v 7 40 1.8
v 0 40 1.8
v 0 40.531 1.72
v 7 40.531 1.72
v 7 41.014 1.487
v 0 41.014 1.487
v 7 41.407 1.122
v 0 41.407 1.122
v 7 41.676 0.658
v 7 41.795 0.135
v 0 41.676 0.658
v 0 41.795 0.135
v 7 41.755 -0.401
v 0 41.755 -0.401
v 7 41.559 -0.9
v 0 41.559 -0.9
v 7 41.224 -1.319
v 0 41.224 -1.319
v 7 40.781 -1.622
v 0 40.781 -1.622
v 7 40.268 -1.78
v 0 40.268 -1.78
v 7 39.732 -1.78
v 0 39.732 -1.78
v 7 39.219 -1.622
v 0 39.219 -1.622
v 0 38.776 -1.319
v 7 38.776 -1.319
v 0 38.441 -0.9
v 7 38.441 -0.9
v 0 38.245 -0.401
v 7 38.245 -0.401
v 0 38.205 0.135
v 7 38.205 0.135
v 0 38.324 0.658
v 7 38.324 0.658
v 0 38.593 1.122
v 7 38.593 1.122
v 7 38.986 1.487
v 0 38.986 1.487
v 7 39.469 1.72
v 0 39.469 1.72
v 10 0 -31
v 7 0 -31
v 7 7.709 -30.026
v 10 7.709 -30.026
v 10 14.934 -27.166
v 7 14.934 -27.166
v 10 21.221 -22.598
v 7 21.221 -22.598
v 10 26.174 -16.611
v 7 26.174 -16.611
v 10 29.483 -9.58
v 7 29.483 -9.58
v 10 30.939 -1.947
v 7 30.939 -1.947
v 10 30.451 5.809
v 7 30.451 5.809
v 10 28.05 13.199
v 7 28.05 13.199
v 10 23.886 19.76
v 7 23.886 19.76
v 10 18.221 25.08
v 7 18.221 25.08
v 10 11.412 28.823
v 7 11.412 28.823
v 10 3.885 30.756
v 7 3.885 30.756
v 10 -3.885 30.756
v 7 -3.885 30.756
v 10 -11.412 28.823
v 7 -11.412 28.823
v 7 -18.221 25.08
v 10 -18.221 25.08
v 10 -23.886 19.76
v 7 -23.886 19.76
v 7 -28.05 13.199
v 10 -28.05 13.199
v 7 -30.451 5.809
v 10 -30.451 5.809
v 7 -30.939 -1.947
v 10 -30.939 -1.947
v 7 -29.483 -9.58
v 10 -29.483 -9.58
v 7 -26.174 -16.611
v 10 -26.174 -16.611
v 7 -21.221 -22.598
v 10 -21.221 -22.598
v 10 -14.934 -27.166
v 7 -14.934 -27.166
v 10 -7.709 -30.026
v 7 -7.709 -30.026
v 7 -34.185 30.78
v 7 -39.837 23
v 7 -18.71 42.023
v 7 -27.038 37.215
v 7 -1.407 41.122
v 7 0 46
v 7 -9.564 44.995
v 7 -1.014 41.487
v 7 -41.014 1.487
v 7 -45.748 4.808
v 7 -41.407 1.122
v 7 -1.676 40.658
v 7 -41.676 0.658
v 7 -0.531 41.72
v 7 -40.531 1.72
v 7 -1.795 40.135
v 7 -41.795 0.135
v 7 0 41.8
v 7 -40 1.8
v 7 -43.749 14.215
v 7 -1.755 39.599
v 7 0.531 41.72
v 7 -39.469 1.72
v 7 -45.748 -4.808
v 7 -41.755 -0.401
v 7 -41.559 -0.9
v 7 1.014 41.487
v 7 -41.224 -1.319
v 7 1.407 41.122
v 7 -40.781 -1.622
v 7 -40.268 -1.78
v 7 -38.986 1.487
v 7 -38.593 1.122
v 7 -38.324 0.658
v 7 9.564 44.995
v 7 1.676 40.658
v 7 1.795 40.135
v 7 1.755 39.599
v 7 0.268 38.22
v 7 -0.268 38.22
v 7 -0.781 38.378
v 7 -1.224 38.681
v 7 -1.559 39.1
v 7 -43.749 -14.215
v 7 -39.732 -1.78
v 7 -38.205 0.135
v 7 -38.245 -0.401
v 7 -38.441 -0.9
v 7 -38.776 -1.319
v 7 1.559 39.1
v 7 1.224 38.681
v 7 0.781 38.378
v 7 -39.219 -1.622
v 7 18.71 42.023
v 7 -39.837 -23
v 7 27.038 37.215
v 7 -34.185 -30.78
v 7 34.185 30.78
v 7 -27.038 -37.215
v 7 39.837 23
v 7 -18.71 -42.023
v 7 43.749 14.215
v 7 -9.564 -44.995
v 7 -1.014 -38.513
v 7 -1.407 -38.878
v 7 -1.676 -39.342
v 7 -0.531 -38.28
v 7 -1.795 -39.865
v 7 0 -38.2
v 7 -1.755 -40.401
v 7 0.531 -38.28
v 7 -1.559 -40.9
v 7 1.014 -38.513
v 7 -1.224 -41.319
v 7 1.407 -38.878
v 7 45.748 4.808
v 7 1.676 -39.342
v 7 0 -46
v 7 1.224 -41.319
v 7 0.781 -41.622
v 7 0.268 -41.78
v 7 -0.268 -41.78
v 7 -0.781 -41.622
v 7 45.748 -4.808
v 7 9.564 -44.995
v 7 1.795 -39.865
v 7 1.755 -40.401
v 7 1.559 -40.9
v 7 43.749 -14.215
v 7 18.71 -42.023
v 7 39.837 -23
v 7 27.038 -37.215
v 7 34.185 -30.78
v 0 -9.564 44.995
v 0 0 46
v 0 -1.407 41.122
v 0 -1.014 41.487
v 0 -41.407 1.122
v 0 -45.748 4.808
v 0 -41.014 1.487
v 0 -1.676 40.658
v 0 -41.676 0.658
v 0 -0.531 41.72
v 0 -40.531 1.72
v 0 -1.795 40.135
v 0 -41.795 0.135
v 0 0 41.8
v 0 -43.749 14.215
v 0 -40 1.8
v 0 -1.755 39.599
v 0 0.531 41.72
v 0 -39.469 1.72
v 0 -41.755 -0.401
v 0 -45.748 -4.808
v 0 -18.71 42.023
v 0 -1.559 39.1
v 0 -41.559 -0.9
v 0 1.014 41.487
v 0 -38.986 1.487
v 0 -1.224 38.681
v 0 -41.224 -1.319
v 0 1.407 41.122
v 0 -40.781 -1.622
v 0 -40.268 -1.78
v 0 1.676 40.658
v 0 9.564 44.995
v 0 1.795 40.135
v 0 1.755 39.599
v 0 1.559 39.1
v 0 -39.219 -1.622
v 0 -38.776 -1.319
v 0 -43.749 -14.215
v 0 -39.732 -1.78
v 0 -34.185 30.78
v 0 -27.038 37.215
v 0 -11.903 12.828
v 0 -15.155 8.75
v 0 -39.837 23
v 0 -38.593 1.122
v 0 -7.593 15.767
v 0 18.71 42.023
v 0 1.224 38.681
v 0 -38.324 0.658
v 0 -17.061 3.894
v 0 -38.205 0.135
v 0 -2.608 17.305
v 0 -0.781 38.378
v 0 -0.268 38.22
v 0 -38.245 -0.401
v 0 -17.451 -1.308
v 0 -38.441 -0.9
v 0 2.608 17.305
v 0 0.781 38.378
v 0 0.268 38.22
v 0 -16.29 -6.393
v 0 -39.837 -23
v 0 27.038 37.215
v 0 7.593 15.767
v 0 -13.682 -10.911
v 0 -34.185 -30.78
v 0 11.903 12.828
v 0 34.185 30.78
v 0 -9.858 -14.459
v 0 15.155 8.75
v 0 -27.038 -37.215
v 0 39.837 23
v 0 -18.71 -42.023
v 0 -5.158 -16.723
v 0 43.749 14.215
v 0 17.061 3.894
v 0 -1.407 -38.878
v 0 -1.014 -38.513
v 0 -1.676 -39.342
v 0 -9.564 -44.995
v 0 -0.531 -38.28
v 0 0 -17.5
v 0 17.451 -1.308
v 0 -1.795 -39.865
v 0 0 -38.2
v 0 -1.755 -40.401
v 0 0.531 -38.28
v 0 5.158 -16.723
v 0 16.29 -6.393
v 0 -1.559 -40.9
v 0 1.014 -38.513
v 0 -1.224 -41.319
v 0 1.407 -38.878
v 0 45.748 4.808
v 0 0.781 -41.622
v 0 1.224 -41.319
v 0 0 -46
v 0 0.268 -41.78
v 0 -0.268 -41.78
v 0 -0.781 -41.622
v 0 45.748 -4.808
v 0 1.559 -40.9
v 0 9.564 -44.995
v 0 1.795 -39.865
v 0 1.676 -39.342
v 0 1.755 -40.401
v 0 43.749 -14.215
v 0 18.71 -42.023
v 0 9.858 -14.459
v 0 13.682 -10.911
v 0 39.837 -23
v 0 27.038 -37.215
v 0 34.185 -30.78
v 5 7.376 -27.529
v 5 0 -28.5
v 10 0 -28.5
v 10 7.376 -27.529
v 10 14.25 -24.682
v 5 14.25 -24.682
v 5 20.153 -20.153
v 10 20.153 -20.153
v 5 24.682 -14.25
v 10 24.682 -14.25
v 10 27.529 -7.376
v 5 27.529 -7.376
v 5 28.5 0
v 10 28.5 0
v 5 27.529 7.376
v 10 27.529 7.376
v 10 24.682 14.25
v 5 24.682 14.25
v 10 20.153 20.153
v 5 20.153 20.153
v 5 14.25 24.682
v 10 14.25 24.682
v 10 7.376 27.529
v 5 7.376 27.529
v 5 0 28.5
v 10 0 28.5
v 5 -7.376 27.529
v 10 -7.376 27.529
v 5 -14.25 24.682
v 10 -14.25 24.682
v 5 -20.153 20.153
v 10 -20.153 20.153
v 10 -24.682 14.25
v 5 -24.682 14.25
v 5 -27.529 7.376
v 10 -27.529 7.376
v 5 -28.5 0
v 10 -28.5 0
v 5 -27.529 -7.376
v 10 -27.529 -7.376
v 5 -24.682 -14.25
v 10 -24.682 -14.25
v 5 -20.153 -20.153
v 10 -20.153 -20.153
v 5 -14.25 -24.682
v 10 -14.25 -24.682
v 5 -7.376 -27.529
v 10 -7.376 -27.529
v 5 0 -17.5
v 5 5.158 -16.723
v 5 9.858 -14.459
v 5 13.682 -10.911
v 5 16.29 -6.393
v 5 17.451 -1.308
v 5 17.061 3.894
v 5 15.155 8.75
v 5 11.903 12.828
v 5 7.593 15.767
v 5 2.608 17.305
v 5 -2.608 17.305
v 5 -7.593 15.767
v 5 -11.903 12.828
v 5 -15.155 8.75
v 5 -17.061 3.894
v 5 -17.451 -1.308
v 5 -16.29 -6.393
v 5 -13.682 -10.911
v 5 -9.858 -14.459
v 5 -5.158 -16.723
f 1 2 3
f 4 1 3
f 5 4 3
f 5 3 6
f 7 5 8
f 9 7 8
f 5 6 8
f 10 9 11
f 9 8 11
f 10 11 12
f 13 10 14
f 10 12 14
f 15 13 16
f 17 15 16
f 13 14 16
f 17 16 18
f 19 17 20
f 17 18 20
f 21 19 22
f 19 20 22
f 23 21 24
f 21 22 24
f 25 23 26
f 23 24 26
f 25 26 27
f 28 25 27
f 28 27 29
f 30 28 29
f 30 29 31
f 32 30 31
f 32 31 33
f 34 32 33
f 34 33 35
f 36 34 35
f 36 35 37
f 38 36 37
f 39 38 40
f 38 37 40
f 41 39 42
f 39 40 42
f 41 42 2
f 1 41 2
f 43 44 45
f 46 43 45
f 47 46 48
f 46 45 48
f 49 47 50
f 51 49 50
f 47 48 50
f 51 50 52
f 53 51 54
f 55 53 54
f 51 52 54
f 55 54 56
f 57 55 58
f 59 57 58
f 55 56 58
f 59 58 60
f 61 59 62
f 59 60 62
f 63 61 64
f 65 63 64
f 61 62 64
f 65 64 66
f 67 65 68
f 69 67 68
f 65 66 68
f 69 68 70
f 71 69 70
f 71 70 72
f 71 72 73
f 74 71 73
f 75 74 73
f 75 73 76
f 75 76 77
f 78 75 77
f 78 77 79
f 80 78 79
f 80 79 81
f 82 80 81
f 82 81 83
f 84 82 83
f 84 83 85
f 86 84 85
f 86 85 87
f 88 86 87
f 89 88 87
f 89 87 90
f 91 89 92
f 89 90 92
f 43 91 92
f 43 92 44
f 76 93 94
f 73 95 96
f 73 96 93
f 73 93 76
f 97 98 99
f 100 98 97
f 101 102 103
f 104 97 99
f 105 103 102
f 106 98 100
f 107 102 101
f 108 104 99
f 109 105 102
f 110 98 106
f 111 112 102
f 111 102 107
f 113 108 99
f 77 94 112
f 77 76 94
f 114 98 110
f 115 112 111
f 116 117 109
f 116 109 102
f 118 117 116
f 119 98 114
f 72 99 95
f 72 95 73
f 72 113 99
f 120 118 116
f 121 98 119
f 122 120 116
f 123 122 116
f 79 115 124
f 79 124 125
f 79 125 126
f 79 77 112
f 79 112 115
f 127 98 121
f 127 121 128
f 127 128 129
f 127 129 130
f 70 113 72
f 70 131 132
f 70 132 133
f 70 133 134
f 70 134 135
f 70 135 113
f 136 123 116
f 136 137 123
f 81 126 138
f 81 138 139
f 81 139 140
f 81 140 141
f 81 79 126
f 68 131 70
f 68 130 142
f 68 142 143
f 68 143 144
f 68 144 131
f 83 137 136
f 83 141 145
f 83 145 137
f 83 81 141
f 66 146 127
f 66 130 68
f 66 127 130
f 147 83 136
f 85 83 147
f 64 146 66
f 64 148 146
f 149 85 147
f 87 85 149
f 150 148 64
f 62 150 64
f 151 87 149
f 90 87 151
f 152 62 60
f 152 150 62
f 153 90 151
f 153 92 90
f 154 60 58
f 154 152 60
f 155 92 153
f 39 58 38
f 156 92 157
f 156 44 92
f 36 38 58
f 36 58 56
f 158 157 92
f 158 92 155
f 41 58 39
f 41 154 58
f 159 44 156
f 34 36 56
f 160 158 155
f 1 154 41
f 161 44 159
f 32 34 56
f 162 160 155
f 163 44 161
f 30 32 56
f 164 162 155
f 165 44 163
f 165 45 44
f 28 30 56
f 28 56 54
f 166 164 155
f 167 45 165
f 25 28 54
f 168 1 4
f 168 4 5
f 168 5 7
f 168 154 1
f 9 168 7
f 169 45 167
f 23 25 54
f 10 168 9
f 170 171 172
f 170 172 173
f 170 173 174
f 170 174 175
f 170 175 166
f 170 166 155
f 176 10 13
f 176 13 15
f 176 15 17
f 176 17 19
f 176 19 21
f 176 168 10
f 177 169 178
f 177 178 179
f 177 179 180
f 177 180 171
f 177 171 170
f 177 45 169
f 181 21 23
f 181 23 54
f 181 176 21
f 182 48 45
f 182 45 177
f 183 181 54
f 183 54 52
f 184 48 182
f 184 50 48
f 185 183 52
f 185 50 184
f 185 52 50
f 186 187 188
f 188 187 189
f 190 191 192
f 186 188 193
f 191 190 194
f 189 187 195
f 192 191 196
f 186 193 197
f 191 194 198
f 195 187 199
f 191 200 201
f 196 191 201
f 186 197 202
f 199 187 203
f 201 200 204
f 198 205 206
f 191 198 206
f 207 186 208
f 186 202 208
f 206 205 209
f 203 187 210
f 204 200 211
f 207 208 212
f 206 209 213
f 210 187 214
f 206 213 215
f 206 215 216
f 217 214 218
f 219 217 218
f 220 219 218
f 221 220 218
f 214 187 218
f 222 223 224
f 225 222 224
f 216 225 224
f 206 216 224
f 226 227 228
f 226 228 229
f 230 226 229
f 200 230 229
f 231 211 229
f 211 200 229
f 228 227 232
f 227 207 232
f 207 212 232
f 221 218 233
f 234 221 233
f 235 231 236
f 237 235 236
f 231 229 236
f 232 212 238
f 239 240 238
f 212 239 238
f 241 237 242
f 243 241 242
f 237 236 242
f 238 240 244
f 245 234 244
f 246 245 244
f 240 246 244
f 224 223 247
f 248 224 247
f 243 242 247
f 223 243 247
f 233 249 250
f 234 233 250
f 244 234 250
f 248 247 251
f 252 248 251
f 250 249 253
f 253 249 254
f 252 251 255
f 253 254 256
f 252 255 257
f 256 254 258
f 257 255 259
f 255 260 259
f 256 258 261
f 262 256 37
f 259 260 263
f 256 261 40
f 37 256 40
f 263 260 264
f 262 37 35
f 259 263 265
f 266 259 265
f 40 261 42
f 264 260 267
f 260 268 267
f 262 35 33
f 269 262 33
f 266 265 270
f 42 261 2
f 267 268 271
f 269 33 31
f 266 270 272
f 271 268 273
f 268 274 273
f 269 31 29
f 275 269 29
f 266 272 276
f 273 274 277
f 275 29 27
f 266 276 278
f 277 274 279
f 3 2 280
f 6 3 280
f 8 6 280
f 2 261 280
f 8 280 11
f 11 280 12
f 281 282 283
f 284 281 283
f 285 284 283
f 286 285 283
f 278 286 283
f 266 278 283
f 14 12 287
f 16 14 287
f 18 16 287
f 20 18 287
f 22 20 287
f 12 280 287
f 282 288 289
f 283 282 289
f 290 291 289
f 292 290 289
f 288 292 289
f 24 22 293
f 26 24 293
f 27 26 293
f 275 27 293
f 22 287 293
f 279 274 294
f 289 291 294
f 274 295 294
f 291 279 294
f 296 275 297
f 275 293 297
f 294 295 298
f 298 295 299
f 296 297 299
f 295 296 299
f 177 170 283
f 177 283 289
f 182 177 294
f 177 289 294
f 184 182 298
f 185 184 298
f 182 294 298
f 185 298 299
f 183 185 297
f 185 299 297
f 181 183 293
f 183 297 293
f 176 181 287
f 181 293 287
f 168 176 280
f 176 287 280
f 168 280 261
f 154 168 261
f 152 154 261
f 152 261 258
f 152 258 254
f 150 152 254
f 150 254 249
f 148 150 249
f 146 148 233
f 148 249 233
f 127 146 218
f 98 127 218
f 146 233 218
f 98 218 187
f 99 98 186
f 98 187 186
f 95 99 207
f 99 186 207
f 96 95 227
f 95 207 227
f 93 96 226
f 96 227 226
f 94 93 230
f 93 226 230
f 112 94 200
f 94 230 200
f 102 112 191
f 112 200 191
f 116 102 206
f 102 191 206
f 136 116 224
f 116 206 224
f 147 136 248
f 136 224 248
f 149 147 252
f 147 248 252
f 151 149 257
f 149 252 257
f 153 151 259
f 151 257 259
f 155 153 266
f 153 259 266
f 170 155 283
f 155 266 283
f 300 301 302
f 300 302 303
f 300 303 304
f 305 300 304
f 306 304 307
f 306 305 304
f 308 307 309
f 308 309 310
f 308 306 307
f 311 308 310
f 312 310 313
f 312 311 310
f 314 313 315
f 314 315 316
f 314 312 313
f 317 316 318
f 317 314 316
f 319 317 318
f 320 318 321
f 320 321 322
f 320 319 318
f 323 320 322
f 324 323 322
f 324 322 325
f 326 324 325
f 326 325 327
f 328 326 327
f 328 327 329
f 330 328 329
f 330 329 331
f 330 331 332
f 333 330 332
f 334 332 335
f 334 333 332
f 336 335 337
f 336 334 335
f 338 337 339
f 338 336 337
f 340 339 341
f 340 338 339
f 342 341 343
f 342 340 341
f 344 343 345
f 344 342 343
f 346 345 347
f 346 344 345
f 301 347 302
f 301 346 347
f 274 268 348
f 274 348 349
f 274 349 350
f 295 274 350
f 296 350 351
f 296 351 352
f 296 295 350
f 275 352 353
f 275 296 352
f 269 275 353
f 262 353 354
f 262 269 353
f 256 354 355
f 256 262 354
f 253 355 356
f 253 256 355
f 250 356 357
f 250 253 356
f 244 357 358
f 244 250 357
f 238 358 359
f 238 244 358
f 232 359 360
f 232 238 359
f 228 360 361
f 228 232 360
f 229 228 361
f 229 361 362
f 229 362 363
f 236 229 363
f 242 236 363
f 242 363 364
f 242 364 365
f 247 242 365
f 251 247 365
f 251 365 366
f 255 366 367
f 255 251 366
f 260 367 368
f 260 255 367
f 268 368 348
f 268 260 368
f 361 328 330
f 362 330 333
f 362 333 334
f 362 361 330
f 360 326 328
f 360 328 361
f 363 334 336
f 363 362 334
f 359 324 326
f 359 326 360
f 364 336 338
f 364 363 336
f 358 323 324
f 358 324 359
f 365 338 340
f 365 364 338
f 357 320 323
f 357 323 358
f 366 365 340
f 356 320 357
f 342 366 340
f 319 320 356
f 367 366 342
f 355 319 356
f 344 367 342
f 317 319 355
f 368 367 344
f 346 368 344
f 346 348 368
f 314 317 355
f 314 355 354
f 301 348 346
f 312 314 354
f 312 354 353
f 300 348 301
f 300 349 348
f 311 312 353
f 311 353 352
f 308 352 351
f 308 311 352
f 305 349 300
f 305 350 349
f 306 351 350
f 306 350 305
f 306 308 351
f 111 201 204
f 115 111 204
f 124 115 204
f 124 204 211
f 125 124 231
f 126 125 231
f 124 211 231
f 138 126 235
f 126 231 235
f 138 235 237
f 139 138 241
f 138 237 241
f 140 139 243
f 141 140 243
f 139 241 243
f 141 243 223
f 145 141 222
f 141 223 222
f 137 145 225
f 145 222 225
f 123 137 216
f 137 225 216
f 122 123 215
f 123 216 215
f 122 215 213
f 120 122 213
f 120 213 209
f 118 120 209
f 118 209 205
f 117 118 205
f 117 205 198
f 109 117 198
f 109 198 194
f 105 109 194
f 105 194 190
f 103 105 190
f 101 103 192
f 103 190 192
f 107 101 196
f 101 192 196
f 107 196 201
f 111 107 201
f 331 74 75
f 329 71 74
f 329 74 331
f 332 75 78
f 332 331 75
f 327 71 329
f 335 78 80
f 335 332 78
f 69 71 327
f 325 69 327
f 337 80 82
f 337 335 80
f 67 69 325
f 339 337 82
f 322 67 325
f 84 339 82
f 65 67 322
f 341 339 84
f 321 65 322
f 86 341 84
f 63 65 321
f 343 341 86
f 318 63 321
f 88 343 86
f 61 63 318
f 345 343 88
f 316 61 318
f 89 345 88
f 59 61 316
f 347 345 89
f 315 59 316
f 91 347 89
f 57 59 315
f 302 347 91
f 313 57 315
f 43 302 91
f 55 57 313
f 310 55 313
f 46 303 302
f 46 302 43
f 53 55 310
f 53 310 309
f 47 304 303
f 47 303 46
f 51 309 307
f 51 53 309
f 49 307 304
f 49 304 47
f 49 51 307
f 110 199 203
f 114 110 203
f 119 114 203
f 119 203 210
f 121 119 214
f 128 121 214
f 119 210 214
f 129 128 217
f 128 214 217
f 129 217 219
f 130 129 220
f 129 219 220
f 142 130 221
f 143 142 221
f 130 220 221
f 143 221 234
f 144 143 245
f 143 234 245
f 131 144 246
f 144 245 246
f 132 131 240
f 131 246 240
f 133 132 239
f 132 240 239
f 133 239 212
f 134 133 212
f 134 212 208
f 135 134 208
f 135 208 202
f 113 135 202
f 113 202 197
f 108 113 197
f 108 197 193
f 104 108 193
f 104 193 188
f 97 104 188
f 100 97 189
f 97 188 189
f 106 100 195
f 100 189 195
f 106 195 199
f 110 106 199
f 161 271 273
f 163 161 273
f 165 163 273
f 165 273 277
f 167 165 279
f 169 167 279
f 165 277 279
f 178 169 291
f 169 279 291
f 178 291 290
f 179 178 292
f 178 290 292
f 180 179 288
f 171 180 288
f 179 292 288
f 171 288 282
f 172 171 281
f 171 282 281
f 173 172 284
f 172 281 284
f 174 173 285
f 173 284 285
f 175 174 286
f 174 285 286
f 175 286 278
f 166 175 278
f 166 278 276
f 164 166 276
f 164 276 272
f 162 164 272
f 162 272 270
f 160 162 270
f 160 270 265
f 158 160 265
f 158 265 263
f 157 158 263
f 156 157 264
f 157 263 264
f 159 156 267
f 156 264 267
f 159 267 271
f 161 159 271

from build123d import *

# Parameters (mm, degrees)
SKETCH_1_R          = 46
SKETCH_1_R_2        = 17.5
EXTRUDE_1_DEPTH     = 5
SKETCH_2_R          = 31
SKETCH_2_R_2        = 28.5
EXTRUDE_2_DEPTH     = 5
SKETCH_4_R          = 46
SKETCH_4_R_2        = 31
EXTRUDE_3_DEPTH     = 2
SKETCH_5_R          = 1.8
CUT_EXTRUDE_1_DEPTH = 7


with BuildPart() as part:
    # 草图1 → 凸台-拉伸1 (new body)
    with BuildSketch(Plane(origin=(0, 0, 0), x_dir=(0, 0, -1), z_dir=(1, 0, 0))):
        Circle(SKETCH_1_R)
        Circle(SKETCH_1_R_2, mode=Mode.SUBTRACT)
    extrude(amount=EXTRUDE_1_DEPTH)

    # 草图2 → 凸台-拉伸2 (add)
    with BuildSketch(Plane(origin=(5, 0, 0), x_dir=(0, 0, -1), z_dir=(1, 0, 0))):
        Circle(SKETCH_2_R)
        Circle(SKETCH_2_R_2, mode=Mode.SUBTRACT)
    extrude(amount=EXTRUDE_2_DEPTH)

    # 草图4 → 凸台-拉伸3 (add)
    with BuildSketch(Plane(origin=(5, 0, 0), x_dir=(0, 0, -1), z_dir=(1, 0, 0))):
        Circle(SKETCH_4_R)
        Circle(SKETCH_4_R_2, mode=Mode.SUBTRACT)
    extrude(amount=EXTRUDE_3_DEPTH)

    # 草图5 → 切除-拉伸1 (cut)
    with BuildSketch(Plane.ZY):
        with Locations((0, 40)):
            Circle(SKETCH_5_R)
        with Locations((40, 0)):
            Circle(SKETCH_5_R)
        with Locations((0, -40)):
            Circle(SKETCH_5_R)
        with Locations((-40, 0)):
            Circle(SKETCH_5_R)
    extrude(amount=-CUT_EXTRUDE_1_DEPTH, mode=Mode.SUBTRACT)


solid = part.part
